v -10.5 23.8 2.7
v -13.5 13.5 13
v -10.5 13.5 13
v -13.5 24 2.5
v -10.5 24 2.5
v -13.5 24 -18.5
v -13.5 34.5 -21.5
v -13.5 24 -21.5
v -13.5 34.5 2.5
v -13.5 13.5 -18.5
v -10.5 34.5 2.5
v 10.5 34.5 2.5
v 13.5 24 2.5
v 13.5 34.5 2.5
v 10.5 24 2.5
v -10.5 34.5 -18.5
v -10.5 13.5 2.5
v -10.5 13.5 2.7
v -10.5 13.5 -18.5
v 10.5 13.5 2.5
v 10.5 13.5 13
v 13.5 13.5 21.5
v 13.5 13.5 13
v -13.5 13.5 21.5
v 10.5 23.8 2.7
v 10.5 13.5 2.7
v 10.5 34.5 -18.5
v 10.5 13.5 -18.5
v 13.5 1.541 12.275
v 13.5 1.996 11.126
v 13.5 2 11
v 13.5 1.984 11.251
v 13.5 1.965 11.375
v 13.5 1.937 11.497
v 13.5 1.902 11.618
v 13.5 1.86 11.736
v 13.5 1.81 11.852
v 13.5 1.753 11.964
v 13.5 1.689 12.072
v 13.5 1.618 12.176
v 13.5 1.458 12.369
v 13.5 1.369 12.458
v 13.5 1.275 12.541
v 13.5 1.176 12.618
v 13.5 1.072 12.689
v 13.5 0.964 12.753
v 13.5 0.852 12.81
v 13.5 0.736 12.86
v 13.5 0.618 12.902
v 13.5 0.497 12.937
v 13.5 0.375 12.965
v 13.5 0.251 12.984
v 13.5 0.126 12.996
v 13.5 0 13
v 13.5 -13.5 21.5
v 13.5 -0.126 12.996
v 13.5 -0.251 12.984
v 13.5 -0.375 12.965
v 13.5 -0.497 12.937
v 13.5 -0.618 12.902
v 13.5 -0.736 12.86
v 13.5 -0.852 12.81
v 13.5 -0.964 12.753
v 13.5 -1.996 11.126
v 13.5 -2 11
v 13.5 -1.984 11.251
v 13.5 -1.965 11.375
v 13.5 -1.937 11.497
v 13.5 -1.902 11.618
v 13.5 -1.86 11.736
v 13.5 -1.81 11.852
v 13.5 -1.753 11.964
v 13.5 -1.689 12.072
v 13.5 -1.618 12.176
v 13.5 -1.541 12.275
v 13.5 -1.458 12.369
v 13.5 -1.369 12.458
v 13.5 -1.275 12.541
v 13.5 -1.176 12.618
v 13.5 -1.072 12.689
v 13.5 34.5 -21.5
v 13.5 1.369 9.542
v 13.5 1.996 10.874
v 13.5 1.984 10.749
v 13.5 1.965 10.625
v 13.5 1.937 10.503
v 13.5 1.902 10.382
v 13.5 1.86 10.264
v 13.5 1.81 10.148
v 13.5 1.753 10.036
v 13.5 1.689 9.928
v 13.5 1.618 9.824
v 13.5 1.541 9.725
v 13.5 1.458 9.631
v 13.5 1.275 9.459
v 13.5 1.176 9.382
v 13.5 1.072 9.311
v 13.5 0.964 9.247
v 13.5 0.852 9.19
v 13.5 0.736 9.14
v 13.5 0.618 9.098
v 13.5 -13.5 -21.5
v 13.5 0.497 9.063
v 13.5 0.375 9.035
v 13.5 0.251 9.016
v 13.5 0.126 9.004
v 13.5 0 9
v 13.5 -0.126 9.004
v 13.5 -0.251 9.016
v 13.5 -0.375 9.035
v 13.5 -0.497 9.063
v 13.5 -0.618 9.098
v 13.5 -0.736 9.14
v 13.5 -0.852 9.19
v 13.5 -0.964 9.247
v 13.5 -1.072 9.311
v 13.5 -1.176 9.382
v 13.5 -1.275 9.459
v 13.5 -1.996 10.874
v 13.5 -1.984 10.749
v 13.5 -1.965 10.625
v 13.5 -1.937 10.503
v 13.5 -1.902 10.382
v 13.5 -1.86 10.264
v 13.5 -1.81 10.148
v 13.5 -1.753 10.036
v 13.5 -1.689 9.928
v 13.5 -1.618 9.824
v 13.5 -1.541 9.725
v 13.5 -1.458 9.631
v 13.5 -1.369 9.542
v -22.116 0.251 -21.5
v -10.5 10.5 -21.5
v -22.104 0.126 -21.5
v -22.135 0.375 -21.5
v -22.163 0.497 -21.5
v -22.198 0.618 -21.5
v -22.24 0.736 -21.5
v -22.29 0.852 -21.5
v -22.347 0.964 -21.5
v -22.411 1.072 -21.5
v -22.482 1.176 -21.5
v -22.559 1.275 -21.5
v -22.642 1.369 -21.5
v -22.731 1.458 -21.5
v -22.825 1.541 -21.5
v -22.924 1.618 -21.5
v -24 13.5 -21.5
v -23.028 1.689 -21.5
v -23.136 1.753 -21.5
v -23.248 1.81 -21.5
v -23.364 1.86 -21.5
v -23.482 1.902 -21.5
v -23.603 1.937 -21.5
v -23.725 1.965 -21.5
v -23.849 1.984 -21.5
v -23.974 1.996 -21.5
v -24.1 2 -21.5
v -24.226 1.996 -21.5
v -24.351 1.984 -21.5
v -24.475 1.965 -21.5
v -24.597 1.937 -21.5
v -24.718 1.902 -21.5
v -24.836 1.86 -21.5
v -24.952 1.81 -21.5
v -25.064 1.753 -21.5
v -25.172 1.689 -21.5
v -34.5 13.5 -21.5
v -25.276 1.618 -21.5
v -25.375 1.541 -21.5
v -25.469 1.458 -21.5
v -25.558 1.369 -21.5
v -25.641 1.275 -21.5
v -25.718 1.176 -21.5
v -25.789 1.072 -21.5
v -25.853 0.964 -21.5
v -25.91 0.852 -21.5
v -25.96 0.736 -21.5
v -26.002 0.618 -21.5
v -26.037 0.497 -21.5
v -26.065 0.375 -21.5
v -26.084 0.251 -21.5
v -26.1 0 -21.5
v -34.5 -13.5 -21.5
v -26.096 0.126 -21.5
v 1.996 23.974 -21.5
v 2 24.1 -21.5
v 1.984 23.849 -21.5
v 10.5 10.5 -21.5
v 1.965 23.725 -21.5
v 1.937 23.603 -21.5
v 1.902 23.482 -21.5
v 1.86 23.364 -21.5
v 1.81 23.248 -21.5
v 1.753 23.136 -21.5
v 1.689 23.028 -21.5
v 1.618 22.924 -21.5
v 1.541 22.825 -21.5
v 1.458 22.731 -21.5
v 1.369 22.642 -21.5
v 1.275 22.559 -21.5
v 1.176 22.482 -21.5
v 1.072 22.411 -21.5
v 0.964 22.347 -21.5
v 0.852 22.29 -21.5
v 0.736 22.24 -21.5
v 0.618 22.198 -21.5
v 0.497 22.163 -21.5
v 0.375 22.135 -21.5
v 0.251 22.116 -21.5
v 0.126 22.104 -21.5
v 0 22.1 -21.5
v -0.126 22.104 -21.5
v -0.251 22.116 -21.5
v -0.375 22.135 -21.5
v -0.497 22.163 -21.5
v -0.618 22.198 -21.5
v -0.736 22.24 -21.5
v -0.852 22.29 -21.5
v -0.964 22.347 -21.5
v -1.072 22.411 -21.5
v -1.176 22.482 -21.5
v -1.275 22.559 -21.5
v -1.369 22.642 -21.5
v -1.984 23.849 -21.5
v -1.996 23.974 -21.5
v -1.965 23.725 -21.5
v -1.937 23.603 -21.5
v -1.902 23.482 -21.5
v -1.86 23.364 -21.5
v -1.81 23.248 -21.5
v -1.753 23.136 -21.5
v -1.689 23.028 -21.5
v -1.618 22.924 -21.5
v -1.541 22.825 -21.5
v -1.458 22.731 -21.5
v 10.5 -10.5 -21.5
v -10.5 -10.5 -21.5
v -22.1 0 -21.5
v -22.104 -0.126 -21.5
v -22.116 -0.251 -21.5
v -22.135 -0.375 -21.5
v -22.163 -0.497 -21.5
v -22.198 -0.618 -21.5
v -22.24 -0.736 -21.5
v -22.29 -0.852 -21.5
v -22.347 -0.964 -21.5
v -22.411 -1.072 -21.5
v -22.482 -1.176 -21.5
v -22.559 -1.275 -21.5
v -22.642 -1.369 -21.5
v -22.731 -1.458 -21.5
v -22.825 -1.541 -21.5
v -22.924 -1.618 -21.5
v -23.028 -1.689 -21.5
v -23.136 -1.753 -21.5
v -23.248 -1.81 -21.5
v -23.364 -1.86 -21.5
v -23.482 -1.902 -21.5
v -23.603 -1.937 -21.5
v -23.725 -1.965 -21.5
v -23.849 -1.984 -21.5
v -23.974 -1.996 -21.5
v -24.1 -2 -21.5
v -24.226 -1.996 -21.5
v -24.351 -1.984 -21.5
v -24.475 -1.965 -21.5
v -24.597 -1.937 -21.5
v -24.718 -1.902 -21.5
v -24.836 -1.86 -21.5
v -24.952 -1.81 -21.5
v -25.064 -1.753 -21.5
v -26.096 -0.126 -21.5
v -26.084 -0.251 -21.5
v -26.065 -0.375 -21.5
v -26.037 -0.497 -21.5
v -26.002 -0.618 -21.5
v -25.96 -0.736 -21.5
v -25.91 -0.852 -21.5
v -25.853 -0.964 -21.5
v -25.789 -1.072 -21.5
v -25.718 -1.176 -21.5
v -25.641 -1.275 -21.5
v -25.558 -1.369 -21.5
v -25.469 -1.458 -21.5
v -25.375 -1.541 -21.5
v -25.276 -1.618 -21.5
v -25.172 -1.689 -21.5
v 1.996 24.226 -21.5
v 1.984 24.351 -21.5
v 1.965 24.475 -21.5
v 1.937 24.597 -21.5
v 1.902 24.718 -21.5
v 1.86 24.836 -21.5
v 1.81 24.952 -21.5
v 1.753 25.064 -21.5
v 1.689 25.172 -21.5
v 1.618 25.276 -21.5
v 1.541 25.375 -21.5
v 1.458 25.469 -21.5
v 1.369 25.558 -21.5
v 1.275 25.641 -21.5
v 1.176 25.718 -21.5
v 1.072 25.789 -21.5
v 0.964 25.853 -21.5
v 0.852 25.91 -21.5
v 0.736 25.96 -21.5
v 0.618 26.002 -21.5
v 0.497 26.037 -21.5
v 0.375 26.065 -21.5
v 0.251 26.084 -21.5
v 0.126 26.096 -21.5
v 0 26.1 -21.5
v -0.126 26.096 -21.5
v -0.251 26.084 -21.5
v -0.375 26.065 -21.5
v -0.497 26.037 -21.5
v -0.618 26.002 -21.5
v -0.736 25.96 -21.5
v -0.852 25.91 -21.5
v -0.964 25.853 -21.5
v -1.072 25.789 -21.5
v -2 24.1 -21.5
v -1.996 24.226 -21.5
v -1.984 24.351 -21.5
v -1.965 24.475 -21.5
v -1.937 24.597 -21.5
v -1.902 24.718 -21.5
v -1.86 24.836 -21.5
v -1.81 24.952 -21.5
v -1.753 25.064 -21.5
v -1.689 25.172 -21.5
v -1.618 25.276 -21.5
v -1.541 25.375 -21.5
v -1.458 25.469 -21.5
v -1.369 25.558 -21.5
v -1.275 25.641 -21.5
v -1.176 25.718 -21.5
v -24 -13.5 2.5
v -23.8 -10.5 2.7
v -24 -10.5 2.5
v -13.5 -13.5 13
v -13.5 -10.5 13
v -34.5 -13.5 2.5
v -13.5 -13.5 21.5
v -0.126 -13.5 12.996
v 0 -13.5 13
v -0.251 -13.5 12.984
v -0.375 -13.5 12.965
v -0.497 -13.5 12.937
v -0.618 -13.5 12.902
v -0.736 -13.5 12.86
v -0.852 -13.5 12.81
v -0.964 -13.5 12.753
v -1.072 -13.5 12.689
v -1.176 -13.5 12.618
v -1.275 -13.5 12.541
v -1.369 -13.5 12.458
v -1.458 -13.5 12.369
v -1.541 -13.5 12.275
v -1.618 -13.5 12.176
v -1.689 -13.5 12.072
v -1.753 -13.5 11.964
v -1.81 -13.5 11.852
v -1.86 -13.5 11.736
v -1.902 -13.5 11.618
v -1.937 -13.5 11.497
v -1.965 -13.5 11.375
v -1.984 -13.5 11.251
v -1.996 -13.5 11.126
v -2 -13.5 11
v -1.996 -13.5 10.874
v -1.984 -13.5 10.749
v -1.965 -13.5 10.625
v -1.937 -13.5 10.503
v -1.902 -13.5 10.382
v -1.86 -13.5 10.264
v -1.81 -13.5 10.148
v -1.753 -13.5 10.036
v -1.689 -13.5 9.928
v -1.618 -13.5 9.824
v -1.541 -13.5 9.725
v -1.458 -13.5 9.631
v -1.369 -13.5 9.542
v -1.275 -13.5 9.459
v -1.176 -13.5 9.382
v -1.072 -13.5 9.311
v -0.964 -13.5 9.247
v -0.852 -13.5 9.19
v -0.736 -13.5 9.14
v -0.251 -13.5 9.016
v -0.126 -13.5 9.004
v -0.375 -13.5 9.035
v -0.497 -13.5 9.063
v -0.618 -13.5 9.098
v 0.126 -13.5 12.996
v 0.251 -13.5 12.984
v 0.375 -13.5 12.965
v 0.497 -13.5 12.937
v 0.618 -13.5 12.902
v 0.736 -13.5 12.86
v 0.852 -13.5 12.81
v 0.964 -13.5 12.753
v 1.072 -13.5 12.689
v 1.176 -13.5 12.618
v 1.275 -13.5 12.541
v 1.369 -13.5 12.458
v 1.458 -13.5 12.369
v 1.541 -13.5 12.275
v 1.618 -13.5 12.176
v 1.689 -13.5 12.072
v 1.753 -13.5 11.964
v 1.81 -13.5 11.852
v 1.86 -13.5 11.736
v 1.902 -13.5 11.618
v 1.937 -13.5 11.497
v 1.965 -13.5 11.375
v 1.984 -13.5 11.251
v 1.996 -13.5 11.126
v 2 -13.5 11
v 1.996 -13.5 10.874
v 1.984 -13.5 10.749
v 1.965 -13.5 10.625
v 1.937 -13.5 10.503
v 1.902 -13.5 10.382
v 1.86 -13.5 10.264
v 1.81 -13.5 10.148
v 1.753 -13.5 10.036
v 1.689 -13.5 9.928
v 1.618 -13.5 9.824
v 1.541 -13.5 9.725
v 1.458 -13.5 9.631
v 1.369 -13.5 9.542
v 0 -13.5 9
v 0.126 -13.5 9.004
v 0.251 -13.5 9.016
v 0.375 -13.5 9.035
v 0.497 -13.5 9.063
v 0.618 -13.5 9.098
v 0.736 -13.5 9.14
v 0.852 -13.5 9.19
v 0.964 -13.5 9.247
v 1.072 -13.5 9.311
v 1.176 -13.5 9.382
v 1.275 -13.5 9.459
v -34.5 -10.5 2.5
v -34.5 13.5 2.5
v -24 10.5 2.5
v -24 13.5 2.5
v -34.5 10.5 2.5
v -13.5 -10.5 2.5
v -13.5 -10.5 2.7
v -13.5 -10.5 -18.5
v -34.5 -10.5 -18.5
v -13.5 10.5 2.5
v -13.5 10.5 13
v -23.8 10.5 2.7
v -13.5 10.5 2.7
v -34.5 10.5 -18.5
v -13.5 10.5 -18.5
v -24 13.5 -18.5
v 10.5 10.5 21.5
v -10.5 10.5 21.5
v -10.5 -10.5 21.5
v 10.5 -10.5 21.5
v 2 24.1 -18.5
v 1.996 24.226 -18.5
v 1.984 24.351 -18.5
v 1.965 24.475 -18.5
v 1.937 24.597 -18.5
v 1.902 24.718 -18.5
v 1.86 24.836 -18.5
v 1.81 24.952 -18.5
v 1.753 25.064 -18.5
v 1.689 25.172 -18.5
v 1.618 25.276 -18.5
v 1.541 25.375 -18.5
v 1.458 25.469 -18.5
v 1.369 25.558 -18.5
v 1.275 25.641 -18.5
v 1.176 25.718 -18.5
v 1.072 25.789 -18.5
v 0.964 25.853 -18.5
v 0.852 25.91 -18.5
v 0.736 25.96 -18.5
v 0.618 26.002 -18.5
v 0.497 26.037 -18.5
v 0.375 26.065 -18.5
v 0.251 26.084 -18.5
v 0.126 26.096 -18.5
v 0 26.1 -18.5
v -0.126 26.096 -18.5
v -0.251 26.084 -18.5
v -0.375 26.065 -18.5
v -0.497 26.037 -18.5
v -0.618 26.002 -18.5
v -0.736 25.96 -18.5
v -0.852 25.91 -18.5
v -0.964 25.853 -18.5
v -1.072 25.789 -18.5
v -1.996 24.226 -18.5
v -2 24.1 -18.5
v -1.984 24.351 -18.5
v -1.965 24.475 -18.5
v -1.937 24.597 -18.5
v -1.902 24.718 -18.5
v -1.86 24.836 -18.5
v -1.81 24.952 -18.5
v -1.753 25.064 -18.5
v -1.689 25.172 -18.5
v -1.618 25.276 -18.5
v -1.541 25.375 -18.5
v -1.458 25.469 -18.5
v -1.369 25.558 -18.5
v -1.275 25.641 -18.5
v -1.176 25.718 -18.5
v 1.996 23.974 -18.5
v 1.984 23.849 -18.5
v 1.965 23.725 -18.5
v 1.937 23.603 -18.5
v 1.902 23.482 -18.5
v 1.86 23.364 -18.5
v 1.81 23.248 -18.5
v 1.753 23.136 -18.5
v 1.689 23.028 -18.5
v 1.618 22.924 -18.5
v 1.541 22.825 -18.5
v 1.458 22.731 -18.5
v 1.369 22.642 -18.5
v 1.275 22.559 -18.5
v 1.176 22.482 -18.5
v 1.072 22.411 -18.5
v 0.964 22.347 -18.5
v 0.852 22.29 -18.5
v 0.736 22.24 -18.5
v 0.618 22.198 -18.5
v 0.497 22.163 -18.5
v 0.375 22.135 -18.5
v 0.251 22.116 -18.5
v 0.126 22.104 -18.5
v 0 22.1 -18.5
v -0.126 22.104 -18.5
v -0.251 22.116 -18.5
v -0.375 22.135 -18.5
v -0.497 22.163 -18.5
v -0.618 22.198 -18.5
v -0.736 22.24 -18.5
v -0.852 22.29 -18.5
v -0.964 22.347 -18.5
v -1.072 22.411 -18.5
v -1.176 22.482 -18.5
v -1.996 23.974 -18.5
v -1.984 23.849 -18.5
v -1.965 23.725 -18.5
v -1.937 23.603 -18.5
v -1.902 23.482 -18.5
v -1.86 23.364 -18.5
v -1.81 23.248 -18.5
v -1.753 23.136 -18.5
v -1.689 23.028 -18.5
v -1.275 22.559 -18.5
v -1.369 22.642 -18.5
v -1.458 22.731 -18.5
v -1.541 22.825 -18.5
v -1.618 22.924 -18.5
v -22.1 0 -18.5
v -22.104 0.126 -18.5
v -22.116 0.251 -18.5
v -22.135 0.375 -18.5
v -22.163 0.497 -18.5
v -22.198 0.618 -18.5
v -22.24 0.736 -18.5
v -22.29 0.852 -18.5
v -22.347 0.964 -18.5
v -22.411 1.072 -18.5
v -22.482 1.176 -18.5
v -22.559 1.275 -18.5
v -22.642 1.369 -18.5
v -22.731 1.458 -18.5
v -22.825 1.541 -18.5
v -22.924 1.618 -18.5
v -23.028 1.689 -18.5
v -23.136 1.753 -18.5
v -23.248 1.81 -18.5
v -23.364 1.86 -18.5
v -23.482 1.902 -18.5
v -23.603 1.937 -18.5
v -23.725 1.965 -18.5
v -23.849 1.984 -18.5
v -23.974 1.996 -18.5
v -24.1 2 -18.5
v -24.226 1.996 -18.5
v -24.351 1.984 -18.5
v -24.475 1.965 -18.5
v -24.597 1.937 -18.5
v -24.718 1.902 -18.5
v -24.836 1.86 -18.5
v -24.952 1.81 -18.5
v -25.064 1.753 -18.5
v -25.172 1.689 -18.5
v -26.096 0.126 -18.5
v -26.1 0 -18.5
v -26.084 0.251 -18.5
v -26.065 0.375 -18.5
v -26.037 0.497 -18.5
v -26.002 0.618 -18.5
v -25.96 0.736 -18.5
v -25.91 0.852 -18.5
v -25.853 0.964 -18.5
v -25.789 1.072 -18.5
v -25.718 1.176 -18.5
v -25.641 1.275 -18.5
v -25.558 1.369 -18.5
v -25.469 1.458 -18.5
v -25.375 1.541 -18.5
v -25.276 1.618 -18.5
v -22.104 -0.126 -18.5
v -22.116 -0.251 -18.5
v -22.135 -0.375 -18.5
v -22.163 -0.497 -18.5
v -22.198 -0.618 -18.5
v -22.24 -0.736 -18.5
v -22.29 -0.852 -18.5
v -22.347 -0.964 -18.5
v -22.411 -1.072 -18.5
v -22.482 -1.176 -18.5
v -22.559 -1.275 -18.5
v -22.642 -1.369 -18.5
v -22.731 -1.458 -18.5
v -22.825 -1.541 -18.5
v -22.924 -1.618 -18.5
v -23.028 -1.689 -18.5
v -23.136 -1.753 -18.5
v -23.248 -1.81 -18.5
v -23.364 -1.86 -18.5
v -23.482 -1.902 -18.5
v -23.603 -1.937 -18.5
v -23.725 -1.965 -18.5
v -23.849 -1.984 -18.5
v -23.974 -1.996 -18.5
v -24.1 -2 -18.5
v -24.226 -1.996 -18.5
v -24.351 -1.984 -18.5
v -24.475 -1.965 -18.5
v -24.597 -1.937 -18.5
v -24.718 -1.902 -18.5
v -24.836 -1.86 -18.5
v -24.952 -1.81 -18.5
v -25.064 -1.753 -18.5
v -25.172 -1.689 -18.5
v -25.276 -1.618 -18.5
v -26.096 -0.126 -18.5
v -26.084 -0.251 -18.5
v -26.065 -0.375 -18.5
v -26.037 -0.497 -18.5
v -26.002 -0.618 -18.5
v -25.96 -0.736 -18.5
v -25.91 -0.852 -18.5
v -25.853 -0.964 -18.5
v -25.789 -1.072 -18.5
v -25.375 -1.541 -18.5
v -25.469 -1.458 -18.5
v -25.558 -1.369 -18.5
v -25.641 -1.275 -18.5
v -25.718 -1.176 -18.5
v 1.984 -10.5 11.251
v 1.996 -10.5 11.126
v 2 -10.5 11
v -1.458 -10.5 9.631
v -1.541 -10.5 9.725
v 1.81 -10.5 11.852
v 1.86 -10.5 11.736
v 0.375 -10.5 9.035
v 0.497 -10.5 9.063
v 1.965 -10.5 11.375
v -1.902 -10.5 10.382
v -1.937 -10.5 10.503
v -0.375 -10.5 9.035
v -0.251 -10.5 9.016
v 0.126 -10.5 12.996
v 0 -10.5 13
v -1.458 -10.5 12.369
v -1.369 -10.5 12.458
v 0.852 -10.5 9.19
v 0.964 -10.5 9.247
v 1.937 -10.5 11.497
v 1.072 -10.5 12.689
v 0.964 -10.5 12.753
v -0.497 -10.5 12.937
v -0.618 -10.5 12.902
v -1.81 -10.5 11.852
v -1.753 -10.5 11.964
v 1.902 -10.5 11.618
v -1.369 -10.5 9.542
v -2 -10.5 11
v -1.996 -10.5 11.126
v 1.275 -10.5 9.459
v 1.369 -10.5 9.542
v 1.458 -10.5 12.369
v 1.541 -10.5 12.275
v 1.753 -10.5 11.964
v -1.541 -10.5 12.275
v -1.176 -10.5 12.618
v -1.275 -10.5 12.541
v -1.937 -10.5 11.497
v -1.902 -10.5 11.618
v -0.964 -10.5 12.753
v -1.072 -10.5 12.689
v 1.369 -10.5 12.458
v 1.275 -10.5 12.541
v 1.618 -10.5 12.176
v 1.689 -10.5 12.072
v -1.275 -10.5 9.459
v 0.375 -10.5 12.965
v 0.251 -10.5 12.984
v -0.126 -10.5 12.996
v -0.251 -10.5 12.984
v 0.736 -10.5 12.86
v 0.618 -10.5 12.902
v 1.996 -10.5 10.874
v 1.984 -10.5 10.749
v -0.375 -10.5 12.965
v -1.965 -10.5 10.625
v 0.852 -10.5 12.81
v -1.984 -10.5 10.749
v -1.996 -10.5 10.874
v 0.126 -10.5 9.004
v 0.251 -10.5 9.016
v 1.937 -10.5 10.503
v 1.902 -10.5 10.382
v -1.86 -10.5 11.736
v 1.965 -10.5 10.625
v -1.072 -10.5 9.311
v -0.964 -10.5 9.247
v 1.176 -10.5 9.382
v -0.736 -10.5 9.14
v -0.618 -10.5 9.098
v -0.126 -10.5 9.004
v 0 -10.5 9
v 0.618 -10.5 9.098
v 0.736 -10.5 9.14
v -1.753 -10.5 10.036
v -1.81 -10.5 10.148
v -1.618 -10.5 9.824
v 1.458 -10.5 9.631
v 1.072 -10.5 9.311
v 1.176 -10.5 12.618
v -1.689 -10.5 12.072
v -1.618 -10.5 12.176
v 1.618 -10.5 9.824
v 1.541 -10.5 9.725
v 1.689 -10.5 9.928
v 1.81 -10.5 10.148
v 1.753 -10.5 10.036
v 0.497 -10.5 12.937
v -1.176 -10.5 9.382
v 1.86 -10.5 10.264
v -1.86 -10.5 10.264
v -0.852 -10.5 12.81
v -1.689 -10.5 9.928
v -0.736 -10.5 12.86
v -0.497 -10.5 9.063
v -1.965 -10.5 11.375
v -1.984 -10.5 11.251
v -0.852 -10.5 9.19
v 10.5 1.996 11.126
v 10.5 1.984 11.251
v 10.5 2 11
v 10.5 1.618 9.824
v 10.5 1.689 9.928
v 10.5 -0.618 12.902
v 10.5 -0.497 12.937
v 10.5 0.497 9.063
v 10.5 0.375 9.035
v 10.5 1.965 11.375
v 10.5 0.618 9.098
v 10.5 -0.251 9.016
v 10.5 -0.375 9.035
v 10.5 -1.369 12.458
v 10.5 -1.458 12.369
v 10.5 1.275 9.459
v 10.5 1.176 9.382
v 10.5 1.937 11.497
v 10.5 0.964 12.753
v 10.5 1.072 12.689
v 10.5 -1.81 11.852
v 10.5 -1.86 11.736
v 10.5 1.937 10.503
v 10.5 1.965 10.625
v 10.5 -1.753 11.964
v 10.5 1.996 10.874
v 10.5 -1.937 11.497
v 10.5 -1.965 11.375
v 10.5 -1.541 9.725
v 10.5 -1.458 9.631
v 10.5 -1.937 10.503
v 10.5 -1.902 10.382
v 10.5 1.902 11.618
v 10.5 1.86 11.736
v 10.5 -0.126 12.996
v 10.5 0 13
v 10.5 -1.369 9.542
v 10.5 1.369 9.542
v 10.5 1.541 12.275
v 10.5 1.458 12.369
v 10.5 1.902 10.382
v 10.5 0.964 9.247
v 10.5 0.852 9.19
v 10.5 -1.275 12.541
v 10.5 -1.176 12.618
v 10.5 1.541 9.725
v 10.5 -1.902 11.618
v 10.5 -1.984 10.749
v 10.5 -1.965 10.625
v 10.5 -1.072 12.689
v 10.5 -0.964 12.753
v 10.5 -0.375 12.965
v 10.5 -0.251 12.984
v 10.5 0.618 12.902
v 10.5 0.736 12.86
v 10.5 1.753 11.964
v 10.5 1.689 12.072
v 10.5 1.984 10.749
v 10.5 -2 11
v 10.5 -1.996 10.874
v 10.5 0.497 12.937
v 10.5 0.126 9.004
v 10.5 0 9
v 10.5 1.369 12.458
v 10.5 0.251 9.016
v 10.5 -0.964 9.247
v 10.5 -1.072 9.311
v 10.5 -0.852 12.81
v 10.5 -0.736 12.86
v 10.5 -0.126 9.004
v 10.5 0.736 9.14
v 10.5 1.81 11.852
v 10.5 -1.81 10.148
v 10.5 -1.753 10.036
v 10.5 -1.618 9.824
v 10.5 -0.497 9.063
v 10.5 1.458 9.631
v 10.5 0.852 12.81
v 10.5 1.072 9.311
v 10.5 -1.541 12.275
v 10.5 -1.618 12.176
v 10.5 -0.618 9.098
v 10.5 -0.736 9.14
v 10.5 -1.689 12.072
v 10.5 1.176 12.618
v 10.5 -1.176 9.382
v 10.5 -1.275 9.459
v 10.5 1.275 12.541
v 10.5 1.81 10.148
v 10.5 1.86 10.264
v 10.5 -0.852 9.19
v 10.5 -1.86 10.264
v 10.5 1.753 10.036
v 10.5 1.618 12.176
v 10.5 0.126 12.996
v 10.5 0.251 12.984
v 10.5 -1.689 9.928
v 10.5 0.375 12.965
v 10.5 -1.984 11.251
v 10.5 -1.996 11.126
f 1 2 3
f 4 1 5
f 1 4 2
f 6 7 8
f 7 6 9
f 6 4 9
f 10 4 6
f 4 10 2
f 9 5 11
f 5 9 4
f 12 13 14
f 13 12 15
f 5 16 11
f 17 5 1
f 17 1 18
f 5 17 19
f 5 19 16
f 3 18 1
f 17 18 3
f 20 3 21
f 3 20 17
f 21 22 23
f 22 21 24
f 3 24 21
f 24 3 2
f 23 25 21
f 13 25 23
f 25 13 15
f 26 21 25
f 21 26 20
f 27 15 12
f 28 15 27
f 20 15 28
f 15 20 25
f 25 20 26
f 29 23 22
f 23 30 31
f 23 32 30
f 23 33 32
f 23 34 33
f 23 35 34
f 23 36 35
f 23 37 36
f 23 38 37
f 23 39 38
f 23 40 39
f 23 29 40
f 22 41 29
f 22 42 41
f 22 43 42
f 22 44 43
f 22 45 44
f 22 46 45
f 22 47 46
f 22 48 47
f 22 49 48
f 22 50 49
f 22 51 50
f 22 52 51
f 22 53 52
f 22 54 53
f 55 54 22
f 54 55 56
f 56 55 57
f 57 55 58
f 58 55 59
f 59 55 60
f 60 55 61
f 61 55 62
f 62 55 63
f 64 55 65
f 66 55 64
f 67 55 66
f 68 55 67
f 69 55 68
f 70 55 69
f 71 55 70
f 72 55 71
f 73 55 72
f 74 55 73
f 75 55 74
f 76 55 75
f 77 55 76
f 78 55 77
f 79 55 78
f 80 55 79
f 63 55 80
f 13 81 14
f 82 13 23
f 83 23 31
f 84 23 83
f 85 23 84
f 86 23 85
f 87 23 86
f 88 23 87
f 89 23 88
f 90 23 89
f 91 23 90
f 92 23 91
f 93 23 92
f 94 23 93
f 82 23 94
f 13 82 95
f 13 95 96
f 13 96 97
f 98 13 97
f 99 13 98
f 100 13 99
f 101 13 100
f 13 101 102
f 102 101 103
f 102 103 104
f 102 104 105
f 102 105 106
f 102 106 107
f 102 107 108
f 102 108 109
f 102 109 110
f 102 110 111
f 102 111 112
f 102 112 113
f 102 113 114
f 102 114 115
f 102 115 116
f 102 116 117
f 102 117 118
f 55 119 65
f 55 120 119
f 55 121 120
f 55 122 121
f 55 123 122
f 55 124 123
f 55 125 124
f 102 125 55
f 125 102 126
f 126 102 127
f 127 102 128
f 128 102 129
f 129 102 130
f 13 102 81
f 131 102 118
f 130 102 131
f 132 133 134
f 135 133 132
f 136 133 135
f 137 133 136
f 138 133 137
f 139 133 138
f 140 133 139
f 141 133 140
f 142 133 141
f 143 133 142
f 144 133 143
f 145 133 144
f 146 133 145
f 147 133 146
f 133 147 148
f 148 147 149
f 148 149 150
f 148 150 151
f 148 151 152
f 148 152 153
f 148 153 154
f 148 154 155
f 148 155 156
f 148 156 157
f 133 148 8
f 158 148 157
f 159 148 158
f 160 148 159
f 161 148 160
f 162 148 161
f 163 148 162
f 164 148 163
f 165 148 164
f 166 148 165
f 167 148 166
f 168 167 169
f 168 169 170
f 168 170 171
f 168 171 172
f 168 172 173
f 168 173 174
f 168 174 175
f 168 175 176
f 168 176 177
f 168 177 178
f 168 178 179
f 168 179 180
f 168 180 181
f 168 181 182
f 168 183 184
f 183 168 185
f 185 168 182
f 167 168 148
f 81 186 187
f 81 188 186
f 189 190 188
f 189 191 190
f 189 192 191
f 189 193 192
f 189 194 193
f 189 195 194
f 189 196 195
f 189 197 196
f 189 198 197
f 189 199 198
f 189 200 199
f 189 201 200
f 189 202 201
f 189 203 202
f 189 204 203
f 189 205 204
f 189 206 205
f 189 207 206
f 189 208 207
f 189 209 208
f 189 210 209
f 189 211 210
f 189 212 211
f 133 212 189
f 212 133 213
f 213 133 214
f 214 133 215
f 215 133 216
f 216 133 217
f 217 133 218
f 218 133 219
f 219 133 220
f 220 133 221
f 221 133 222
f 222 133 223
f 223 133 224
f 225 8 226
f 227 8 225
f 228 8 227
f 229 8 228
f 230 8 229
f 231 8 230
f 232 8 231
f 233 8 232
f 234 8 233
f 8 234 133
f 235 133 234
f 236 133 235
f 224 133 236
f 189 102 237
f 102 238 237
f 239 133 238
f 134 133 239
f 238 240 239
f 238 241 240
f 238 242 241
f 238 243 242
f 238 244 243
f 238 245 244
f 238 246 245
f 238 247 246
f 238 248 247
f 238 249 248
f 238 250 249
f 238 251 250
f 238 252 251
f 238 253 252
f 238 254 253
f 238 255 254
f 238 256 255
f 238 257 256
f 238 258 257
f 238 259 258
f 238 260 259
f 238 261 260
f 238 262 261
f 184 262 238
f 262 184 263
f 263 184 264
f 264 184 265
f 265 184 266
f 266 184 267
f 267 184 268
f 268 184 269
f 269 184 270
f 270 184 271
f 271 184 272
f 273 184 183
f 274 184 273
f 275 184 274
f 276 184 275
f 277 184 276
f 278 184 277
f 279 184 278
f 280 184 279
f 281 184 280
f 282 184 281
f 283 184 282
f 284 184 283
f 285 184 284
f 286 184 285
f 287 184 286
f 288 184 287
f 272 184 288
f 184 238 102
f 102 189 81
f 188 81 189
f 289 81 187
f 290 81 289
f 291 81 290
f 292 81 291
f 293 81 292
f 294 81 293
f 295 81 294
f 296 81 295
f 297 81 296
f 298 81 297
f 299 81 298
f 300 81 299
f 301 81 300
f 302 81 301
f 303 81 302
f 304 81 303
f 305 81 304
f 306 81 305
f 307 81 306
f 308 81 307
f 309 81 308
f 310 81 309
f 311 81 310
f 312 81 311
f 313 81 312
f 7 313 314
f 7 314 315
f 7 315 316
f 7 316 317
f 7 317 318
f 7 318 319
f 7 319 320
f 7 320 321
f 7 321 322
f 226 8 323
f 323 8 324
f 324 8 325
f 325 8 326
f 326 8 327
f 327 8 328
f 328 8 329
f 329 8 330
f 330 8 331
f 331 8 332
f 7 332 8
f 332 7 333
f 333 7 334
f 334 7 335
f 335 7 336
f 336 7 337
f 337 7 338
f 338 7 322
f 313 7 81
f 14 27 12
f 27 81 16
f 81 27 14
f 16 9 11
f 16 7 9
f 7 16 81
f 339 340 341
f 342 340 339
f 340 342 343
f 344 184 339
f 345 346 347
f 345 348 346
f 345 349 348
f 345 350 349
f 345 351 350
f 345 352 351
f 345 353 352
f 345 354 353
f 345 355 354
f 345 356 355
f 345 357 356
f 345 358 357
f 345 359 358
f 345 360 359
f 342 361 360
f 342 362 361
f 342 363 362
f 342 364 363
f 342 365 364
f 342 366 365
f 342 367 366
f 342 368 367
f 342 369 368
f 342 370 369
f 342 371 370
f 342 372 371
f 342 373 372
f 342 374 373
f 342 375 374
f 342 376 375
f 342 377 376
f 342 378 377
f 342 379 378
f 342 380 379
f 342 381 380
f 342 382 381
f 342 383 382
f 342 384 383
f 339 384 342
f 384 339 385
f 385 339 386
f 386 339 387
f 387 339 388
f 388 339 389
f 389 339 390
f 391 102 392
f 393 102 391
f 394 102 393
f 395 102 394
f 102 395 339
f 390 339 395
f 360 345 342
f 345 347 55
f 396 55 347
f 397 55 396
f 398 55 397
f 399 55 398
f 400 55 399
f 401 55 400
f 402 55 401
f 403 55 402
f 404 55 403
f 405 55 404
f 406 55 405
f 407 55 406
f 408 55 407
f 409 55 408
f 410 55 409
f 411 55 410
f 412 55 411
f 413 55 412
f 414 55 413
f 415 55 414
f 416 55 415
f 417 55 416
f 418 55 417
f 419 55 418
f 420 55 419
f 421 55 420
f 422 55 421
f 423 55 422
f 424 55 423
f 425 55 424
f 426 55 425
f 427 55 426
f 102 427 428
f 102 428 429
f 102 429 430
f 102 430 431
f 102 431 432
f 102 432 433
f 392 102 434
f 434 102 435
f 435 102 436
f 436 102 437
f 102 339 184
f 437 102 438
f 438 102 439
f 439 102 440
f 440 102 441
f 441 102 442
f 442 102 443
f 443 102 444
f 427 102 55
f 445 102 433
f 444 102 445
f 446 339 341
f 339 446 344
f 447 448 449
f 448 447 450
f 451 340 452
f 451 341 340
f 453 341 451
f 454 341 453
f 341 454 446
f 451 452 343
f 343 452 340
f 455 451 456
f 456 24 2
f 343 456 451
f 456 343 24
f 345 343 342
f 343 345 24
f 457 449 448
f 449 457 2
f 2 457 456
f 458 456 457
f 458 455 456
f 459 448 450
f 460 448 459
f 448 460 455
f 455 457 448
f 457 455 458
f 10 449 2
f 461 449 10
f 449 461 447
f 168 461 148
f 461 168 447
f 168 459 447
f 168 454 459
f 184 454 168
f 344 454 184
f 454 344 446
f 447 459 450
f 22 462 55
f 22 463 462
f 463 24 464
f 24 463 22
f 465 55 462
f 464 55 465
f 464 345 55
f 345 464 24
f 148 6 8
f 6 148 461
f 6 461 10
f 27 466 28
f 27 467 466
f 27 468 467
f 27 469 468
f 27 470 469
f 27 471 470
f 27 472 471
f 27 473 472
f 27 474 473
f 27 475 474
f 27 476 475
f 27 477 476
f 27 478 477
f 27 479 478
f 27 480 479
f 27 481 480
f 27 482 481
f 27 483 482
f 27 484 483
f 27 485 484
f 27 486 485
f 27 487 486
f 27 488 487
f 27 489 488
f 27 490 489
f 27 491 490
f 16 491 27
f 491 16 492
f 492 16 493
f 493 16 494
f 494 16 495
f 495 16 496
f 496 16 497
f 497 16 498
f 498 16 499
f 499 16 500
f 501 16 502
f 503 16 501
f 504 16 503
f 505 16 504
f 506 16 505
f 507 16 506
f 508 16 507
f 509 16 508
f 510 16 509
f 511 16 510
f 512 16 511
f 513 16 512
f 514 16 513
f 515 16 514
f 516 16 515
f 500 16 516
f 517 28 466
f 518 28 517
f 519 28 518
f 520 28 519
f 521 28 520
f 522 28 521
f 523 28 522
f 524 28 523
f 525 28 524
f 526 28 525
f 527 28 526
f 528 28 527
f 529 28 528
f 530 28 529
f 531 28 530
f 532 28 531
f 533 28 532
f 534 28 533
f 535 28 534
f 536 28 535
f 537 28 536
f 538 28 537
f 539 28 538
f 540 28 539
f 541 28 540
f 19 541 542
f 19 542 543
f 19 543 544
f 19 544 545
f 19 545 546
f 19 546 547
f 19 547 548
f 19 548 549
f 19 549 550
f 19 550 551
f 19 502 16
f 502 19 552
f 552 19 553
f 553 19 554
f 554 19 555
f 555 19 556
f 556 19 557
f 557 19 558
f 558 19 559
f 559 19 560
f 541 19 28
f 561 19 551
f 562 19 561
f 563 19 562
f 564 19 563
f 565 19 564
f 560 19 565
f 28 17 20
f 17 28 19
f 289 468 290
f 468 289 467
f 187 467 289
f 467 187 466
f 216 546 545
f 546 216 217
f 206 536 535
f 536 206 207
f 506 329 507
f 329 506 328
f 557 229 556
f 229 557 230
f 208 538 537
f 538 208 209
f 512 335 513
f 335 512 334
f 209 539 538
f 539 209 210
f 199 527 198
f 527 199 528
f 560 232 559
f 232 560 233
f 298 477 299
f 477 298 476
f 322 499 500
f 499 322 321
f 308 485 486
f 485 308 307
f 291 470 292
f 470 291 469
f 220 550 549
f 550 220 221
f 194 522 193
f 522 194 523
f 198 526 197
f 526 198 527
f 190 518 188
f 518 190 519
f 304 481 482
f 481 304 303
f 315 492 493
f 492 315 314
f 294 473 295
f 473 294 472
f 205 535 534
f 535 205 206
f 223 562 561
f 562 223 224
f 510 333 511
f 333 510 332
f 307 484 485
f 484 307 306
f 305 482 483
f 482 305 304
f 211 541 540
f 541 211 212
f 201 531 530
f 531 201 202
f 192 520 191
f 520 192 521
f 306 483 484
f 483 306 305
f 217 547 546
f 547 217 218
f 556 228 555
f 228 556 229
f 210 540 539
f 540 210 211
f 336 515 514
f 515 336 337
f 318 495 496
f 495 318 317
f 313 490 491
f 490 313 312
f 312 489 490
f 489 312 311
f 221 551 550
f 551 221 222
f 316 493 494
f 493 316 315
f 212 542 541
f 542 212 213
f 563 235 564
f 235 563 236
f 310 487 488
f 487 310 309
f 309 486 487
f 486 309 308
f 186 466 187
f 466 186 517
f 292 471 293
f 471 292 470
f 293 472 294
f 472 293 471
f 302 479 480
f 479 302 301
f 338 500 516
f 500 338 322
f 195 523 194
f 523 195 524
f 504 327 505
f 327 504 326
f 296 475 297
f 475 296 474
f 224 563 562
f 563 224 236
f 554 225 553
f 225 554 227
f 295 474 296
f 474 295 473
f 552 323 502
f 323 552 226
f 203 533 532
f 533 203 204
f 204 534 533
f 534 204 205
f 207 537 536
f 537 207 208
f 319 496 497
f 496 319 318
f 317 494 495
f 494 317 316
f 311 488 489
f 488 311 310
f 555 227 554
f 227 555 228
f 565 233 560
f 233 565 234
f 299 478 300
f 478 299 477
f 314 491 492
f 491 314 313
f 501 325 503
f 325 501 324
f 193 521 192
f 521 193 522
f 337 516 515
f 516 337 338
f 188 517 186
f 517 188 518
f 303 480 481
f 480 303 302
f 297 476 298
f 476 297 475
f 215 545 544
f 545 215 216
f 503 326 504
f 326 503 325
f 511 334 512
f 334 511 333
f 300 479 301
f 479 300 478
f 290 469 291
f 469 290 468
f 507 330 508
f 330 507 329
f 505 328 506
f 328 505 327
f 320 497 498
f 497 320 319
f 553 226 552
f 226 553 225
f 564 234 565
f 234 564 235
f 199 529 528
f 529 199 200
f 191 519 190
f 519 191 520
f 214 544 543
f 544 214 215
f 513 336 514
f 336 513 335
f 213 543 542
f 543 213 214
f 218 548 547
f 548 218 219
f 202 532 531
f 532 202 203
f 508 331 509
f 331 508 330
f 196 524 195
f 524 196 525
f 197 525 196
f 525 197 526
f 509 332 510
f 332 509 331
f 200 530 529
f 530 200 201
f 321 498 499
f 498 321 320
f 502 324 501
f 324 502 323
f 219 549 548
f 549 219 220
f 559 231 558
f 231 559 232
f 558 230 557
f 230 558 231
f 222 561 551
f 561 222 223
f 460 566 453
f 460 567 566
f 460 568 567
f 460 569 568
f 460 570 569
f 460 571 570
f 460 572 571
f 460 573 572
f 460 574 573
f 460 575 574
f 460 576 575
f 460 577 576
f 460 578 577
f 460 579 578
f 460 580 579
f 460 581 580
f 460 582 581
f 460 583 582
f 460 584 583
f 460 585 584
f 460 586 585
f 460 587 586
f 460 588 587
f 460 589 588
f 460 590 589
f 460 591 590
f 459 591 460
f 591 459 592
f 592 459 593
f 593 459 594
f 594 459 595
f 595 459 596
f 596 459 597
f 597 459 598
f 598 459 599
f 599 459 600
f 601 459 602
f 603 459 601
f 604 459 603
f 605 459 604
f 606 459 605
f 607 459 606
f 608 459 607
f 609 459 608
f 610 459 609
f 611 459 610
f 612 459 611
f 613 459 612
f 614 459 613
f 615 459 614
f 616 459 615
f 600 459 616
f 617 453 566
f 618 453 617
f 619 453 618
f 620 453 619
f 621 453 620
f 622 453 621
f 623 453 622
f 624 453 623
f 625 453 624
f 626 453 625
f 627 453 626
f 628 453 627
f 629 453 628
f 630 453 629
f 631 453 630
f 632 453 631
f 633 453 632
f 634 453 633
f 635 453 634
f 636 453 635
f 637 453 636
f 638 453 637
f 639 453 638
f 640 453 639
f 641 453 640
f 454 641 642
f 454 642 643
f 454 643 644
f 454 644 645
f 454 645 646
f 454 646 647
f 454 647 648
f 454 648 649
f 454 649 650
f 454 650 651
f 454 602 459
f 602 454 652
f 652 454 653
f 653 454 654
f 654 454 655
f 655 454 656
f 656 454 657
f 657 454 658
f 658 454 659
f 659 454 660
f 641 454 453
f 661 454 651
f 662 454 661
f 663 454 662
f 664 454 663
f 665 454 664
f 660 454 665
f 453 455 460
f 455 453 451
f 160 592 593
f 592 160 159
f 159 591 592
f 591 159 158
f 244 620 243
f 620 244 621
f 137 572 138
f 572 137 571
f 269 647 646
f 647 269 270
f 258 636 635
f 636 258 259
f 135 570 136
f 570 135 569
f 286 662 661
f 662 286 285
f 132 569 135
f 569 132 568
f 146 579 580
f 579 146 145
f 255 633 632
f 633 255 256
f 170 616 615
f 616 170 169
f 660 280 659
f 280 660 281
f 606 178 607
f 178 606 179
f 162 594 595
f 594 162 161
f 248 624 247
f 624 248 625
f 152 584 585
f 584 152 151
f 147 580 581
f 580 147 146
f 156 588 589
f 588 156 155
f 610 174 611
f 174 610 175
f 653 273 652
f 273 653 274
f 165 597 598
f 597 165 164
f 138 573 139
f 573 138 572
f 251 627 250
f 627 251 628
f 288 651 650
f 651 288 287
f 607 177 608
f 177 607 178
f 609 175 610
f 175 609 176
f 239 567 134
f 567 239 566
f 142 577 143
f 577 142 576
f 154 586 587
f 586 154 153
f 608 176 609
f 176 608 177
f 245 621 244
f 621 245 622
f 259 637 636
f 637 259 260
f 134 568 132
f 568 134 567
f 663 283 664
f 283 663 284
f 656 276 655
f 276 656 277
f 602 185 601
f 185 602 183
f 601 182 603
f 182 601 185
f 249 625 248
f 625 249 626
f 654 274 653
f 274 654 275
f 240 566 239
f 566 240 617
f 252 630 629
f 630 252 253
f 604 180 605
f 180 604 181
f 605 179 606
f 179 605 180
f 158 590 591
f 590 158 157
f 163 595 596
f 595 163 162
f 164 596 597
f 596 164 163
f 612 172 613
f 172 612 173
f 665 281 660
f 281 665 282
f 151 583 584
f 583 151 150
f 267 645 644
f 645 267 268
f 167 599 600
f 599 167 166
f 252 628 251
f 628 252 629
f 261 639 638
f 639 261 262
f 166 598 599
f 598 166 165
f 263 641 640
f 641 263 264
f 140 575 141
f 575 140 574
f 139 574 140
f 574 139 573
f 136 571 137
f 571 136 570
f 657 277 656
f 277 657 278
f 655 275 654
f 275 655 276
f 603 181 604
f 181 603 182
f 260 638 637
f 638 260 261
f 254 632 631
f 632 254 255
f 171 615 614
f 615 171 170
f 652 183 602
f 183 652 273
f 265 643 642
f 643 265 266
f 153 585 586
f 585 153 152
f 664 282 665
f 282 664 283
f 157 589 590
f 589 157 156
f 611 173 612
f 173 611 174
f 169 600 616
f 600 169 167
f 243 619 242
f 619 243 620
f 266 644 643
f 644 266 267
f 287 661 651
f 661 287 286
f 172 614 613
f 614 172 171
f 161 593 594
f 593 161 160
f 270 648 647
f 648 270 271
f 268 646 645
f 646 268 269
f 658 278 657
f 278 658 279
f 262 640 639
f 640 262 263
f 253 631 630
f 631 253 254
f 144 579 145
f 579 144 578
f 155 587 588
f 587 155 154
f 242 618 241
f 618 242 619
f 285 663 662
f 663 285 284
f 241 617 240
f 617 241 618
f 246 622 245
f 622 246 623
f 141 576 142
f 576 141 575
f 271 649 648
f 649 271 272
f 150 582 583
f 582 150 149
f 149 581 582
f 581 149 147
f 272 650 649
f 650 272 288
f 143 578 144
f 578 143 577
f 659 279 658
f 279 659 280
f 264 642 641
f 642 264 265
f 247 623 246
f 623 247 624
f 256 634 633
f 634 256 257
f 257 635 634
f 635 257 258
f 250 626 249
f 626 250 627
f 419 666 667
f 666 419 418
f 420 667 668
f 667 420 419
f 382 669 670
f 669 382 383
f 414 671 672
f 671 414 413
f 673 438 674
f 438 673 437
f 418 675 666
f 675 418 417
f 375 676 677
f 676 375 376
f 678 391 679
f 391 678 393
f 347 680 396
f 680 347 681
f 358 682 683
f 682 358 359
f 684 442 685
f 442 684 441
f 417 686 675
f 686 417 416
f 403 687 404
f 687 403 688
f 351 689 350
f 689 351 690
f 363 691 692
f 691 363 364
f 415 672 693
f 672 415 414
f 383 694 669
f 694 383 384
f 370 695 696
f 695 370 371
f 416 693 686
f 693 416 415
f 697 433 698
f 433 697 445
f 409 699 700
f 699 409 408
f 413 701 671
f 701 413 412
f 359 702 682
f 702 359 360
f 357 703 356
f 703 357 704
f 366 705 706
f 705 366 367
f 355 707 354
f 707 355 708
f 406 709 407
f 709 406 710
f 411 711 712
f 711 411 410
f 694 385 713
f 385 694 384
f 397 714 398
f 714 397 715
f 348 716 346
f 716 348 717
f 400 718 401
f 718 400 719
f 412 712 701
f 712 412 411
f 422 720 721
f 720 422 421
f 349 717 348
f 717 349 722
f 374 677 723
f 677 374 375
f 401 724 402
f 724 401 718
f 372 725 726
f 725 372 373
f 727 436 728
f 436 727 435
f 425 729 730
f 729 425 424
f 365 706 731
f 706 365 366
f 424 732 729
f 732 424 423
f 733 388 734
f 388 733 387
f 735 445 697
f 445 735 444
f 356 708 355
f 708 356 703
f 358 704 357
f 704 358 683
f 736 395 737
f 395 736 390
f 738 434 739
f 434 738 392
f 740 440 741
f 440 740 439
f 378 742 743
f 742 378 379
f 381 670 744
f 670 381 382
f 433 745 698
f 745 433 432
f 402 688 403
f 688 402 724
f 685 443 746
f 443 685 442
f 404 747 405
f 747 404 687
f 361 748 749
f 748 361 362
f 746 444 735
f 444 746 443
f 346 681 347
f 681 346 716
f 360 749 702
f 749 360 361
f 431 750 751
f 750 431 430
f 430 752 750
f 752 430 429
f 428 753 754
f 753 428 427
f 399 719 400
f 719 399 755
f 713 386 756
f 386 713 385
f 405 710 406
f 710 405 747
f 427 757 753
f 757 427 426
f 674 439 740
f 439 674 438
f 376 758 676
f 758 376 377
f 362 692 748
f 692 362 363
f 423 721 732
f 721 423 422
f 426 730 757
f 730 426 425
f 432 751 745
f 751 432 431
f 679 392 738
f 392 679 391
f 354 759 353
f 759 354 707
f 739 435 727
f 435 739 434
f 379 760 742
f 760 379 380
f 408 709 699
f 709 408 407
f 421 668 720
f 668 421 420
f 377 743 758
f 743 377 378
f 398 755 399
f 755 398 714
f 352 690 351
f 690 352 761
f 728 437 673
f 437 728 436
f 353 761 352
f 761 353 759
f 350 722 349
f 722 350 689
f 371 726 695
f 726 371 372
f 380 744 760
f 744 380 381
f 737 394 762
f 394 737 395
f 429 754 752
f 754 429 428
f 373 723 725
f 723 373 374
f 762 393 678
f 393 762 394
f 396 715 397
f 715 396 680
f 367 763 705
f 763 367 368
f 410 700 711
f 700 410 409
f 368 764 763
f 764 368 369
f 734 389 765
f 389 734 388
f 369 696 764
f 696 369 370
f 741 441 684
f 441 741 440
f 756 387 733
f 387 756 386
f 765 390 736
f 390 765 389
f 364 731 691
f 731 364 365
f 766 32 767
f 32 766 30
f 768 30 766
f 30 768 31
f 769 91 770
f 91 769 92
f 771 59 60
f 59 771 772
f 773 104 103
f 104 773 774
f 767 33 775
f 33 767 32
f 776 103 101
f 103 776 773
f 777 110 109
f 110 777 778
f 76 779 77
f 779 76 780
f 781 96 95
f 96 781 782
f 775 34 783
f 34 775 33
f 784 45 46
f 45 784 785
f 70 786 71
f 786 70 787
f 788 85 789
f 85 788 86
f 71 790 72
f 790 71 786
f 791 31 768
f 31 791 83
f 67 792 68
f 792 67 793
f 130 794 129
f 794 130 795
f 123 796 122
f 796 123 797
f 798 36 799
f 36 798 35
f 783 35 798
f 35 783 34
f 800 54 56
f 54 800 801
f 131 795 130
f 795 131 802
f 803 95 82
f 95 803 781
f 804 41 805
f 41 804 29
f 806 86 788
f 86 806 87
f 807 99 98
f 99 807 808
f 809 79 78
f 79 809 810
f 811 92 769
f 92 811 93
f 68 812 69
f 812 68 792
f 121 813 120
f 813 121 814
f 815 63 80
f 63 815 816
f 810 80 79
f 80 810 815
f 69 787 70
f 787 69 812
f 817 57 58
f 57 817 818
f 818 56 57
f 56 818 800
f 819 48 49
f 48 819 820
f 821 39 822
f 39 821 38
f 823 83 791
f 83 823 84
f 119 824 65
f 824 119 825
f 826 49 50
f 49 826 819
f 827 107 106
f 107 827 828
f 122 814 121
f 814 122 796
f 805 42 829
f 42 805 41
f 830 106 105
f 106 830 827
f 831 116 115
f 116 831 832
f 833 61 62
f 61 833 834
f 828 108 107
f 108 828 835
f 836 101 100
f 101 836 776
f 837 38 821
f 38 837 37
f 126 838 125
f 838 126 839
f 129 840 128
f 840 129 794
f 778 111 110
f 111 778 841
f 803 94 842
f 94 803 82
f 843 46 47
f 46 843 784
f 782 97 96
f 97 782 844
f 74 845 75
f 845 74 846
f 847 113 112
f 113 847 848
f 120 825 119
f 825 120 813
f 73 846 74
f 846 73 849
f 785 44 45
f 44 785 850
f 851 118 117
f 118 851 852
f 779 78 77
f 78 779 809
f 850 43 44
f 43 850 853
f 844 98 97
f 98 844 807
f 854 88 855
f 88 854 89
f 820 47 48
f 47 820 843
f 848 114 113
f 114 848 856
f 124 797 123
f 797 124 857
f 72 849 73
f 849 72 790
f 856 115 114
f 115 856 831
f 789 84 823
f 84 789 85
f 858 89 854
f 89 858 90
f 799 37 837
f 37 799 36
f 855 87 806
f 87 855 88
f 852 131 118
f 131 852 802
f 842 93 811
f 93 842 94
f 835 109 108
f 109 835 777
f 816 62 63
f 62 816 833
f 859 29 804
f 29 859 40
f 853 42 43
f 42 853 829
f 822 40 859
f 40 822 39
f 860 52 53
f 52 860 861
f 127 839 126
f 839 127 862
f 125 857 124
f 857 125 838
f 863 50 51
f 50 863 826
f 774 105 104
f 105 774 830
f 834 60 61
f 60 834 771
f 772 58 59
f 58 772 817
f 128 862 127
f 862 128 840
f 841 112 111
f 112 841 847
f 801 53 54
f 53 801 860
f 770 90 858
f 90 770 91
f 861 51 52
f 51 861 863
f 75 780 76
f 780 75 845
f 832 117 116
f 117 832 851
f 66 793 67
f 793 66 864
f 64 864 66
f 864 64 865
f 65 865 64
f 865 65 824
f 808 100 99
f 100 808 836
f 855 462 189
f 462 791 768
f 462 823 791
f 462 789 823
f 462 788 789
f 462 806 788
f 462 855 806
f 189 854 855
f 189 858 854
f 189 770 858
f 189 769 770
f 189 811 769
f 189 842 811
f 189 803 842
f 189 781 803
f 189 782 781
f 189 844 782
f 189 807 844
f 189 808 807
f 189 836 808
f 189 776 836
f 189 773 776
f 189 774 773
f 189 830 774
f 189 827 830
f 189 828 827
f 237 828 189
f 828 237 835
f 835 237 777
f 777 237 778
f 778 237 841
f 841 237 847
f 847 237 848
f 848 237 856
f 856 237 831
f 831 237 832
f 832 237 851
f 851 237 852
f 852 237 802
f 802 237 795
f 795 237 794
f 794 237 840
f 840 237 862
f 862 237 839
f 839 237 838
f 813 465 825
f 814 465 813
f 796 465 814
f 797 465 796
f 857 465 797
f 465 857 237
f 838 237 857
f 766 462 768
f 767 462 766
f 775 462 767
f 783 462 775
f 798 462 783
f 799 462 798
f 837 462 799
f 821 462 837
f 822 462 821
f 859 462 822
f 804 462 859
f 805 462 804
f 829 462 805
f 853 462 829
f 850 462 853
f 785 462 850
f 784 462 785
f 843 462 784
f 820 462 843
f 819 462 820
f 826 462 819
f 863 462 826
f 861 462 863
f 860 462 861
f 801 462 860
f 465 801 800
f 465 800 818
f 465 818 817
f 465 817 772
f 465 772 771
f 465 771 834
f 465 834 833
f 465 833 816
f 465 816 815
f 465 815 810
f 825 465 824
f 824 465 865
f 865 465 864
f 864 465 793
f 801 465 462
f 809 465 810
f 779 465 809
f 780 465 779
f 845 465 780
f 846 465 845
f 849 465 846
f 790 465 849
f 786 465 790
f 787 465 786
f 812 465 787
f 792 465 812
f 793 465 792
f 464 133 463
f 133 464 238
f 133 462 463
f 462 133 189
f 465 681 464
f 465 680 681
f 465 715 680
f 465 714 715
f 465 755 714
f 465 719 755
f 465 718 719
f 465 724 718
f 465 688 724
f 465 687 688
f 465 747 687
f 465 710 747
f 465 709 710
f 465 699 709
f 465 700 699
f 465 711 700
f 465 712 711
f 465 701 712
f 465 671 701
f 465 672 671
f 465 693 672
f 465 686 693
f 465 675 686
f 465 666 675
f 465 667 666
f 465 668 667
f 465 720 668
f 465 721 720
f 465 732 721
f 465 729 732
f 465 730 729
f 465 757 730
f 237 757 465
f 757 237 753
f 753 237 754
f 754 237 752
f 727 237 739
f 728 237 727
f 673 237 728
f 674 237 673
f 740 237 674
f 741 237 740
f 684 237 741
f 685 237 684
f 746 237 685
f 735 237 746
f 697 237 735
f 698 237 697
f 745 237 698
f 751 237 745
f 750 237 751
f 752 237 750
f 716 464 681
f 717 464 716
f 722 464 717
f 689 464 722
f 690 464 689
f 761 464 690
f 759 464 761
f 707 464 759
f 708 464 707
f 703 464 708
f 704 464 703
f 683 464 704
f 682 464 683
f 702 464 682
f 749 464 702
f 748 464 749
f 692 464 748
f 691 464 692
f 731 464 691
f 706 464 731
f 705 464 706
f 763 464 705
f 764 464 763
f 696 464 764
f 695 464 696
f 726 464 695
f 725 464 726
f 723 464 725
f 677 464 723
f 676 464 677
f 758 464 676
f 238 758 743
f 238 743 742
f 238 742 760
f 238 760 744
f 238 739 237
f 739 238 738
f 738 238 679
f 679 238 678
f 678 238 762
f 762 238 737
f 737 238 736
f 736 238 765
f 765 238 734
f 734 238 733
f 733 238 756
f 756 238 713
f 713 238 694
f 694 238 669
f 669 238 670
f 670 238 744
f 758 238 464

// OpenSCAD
hauteur 		= 43;
epaisseur		= 3;
profile 		= 21;

fn				= 100;

taille_cadre 	= profile + (2 * epaisseur);

diam_trou_vis 	= 4;

//boolean
has_renfort 	= 1;

difference() {
	union(){
		cube([taille_cadre, taille_cadre, hauteur], center = true);

		for(i = [0, 90]) {
			rotate([0, 0, i]) {
				translate([0, taille_cadre / 2 + profile / 2, - (hauteur - profile - epaisseur) / 2]) {
					cube([taille_cadre, profile, profile + epaisseur], center = true);
				}

				for(n = [-1, 1]) {
					translate([n * (profile + epaisseur) / 2, profile / 2 + epaisseur, profile + epaisseur - hauteur / 2]) {
						polyhedron(points = [
												[- epaisseur / 2, 0, profile / 2],
												[  epaisseur / 2, 0, profile / 2],
												[- epaisseur / 2, 0, 0],
												[  epaisseur / 2, 0, 0],
												[- epaisseur / 2, profile / 2, 0],
												[  epaisseur / 2, profile / 2, 0]
											],
									faces = [
												[0, 4, 5, 1],
												[0, 1, 3, 2],
												[2, 3, 5, 4],
												[1, 5, 3],
												[0, 2, 4]
											]
									);
					}
				}
			}
		}



		translate([ - (profile / 2 + epaisseur), profile / 2 + epaisseur, - (hauteur - epaisseur) / 2]) {
			rotate([0, -90, 0]) {
				polyhedron(points = [
															[- epaisseur / 2, 0, profile / 2],
															[  epaisseur / 2, 0, profile / 2],
															[- epaisseur / 2, 0, 0],
															[  epaisseur / 2, 0, 0],
															[- epaisseur / 2, profile / 2, 0],
															[  epaisseur / 2, profile / 2, 0]
														],
												faces = [
															[0, 4, 5, 1],
															[0, 1, 3, 2],
															[2, 3, 5, 4],
															[1, 5, 3],
															[0, 2, 4]
														]
												);
			}
		}
	}

	
	//excavation centre
	cube([profile, profile, hauteur + 2], center = true);
 
	//excavation bords
	for(i = [0, 90]) {
		rotate([0, 0, i]) {
			translate([0, taille_cadre / 2 + profile / 2 + 0.1, - ((hauteur - profile) / 2 - epaisseur - 0.1)]) {
				cube([profile, profile + 0.2 , profile + 0.2 ], center = true);
				cylinder(h = hauteur, d = diam_trou_vis, center=true, $fn = fn);

			}
		}
	}

	for(i = [0, 90]){
		rotate([0, 0, i]) {
			translate([0, - (profile + epaisseur) / 2, (hauteur - profile) / 2]){
				rotate([90, 0, 0]) {
					cylinder(d = diam_trou_vis, h = epaisseur + 2, center = true, $fn = fn);
				}
			}
		}
	}
	
}
